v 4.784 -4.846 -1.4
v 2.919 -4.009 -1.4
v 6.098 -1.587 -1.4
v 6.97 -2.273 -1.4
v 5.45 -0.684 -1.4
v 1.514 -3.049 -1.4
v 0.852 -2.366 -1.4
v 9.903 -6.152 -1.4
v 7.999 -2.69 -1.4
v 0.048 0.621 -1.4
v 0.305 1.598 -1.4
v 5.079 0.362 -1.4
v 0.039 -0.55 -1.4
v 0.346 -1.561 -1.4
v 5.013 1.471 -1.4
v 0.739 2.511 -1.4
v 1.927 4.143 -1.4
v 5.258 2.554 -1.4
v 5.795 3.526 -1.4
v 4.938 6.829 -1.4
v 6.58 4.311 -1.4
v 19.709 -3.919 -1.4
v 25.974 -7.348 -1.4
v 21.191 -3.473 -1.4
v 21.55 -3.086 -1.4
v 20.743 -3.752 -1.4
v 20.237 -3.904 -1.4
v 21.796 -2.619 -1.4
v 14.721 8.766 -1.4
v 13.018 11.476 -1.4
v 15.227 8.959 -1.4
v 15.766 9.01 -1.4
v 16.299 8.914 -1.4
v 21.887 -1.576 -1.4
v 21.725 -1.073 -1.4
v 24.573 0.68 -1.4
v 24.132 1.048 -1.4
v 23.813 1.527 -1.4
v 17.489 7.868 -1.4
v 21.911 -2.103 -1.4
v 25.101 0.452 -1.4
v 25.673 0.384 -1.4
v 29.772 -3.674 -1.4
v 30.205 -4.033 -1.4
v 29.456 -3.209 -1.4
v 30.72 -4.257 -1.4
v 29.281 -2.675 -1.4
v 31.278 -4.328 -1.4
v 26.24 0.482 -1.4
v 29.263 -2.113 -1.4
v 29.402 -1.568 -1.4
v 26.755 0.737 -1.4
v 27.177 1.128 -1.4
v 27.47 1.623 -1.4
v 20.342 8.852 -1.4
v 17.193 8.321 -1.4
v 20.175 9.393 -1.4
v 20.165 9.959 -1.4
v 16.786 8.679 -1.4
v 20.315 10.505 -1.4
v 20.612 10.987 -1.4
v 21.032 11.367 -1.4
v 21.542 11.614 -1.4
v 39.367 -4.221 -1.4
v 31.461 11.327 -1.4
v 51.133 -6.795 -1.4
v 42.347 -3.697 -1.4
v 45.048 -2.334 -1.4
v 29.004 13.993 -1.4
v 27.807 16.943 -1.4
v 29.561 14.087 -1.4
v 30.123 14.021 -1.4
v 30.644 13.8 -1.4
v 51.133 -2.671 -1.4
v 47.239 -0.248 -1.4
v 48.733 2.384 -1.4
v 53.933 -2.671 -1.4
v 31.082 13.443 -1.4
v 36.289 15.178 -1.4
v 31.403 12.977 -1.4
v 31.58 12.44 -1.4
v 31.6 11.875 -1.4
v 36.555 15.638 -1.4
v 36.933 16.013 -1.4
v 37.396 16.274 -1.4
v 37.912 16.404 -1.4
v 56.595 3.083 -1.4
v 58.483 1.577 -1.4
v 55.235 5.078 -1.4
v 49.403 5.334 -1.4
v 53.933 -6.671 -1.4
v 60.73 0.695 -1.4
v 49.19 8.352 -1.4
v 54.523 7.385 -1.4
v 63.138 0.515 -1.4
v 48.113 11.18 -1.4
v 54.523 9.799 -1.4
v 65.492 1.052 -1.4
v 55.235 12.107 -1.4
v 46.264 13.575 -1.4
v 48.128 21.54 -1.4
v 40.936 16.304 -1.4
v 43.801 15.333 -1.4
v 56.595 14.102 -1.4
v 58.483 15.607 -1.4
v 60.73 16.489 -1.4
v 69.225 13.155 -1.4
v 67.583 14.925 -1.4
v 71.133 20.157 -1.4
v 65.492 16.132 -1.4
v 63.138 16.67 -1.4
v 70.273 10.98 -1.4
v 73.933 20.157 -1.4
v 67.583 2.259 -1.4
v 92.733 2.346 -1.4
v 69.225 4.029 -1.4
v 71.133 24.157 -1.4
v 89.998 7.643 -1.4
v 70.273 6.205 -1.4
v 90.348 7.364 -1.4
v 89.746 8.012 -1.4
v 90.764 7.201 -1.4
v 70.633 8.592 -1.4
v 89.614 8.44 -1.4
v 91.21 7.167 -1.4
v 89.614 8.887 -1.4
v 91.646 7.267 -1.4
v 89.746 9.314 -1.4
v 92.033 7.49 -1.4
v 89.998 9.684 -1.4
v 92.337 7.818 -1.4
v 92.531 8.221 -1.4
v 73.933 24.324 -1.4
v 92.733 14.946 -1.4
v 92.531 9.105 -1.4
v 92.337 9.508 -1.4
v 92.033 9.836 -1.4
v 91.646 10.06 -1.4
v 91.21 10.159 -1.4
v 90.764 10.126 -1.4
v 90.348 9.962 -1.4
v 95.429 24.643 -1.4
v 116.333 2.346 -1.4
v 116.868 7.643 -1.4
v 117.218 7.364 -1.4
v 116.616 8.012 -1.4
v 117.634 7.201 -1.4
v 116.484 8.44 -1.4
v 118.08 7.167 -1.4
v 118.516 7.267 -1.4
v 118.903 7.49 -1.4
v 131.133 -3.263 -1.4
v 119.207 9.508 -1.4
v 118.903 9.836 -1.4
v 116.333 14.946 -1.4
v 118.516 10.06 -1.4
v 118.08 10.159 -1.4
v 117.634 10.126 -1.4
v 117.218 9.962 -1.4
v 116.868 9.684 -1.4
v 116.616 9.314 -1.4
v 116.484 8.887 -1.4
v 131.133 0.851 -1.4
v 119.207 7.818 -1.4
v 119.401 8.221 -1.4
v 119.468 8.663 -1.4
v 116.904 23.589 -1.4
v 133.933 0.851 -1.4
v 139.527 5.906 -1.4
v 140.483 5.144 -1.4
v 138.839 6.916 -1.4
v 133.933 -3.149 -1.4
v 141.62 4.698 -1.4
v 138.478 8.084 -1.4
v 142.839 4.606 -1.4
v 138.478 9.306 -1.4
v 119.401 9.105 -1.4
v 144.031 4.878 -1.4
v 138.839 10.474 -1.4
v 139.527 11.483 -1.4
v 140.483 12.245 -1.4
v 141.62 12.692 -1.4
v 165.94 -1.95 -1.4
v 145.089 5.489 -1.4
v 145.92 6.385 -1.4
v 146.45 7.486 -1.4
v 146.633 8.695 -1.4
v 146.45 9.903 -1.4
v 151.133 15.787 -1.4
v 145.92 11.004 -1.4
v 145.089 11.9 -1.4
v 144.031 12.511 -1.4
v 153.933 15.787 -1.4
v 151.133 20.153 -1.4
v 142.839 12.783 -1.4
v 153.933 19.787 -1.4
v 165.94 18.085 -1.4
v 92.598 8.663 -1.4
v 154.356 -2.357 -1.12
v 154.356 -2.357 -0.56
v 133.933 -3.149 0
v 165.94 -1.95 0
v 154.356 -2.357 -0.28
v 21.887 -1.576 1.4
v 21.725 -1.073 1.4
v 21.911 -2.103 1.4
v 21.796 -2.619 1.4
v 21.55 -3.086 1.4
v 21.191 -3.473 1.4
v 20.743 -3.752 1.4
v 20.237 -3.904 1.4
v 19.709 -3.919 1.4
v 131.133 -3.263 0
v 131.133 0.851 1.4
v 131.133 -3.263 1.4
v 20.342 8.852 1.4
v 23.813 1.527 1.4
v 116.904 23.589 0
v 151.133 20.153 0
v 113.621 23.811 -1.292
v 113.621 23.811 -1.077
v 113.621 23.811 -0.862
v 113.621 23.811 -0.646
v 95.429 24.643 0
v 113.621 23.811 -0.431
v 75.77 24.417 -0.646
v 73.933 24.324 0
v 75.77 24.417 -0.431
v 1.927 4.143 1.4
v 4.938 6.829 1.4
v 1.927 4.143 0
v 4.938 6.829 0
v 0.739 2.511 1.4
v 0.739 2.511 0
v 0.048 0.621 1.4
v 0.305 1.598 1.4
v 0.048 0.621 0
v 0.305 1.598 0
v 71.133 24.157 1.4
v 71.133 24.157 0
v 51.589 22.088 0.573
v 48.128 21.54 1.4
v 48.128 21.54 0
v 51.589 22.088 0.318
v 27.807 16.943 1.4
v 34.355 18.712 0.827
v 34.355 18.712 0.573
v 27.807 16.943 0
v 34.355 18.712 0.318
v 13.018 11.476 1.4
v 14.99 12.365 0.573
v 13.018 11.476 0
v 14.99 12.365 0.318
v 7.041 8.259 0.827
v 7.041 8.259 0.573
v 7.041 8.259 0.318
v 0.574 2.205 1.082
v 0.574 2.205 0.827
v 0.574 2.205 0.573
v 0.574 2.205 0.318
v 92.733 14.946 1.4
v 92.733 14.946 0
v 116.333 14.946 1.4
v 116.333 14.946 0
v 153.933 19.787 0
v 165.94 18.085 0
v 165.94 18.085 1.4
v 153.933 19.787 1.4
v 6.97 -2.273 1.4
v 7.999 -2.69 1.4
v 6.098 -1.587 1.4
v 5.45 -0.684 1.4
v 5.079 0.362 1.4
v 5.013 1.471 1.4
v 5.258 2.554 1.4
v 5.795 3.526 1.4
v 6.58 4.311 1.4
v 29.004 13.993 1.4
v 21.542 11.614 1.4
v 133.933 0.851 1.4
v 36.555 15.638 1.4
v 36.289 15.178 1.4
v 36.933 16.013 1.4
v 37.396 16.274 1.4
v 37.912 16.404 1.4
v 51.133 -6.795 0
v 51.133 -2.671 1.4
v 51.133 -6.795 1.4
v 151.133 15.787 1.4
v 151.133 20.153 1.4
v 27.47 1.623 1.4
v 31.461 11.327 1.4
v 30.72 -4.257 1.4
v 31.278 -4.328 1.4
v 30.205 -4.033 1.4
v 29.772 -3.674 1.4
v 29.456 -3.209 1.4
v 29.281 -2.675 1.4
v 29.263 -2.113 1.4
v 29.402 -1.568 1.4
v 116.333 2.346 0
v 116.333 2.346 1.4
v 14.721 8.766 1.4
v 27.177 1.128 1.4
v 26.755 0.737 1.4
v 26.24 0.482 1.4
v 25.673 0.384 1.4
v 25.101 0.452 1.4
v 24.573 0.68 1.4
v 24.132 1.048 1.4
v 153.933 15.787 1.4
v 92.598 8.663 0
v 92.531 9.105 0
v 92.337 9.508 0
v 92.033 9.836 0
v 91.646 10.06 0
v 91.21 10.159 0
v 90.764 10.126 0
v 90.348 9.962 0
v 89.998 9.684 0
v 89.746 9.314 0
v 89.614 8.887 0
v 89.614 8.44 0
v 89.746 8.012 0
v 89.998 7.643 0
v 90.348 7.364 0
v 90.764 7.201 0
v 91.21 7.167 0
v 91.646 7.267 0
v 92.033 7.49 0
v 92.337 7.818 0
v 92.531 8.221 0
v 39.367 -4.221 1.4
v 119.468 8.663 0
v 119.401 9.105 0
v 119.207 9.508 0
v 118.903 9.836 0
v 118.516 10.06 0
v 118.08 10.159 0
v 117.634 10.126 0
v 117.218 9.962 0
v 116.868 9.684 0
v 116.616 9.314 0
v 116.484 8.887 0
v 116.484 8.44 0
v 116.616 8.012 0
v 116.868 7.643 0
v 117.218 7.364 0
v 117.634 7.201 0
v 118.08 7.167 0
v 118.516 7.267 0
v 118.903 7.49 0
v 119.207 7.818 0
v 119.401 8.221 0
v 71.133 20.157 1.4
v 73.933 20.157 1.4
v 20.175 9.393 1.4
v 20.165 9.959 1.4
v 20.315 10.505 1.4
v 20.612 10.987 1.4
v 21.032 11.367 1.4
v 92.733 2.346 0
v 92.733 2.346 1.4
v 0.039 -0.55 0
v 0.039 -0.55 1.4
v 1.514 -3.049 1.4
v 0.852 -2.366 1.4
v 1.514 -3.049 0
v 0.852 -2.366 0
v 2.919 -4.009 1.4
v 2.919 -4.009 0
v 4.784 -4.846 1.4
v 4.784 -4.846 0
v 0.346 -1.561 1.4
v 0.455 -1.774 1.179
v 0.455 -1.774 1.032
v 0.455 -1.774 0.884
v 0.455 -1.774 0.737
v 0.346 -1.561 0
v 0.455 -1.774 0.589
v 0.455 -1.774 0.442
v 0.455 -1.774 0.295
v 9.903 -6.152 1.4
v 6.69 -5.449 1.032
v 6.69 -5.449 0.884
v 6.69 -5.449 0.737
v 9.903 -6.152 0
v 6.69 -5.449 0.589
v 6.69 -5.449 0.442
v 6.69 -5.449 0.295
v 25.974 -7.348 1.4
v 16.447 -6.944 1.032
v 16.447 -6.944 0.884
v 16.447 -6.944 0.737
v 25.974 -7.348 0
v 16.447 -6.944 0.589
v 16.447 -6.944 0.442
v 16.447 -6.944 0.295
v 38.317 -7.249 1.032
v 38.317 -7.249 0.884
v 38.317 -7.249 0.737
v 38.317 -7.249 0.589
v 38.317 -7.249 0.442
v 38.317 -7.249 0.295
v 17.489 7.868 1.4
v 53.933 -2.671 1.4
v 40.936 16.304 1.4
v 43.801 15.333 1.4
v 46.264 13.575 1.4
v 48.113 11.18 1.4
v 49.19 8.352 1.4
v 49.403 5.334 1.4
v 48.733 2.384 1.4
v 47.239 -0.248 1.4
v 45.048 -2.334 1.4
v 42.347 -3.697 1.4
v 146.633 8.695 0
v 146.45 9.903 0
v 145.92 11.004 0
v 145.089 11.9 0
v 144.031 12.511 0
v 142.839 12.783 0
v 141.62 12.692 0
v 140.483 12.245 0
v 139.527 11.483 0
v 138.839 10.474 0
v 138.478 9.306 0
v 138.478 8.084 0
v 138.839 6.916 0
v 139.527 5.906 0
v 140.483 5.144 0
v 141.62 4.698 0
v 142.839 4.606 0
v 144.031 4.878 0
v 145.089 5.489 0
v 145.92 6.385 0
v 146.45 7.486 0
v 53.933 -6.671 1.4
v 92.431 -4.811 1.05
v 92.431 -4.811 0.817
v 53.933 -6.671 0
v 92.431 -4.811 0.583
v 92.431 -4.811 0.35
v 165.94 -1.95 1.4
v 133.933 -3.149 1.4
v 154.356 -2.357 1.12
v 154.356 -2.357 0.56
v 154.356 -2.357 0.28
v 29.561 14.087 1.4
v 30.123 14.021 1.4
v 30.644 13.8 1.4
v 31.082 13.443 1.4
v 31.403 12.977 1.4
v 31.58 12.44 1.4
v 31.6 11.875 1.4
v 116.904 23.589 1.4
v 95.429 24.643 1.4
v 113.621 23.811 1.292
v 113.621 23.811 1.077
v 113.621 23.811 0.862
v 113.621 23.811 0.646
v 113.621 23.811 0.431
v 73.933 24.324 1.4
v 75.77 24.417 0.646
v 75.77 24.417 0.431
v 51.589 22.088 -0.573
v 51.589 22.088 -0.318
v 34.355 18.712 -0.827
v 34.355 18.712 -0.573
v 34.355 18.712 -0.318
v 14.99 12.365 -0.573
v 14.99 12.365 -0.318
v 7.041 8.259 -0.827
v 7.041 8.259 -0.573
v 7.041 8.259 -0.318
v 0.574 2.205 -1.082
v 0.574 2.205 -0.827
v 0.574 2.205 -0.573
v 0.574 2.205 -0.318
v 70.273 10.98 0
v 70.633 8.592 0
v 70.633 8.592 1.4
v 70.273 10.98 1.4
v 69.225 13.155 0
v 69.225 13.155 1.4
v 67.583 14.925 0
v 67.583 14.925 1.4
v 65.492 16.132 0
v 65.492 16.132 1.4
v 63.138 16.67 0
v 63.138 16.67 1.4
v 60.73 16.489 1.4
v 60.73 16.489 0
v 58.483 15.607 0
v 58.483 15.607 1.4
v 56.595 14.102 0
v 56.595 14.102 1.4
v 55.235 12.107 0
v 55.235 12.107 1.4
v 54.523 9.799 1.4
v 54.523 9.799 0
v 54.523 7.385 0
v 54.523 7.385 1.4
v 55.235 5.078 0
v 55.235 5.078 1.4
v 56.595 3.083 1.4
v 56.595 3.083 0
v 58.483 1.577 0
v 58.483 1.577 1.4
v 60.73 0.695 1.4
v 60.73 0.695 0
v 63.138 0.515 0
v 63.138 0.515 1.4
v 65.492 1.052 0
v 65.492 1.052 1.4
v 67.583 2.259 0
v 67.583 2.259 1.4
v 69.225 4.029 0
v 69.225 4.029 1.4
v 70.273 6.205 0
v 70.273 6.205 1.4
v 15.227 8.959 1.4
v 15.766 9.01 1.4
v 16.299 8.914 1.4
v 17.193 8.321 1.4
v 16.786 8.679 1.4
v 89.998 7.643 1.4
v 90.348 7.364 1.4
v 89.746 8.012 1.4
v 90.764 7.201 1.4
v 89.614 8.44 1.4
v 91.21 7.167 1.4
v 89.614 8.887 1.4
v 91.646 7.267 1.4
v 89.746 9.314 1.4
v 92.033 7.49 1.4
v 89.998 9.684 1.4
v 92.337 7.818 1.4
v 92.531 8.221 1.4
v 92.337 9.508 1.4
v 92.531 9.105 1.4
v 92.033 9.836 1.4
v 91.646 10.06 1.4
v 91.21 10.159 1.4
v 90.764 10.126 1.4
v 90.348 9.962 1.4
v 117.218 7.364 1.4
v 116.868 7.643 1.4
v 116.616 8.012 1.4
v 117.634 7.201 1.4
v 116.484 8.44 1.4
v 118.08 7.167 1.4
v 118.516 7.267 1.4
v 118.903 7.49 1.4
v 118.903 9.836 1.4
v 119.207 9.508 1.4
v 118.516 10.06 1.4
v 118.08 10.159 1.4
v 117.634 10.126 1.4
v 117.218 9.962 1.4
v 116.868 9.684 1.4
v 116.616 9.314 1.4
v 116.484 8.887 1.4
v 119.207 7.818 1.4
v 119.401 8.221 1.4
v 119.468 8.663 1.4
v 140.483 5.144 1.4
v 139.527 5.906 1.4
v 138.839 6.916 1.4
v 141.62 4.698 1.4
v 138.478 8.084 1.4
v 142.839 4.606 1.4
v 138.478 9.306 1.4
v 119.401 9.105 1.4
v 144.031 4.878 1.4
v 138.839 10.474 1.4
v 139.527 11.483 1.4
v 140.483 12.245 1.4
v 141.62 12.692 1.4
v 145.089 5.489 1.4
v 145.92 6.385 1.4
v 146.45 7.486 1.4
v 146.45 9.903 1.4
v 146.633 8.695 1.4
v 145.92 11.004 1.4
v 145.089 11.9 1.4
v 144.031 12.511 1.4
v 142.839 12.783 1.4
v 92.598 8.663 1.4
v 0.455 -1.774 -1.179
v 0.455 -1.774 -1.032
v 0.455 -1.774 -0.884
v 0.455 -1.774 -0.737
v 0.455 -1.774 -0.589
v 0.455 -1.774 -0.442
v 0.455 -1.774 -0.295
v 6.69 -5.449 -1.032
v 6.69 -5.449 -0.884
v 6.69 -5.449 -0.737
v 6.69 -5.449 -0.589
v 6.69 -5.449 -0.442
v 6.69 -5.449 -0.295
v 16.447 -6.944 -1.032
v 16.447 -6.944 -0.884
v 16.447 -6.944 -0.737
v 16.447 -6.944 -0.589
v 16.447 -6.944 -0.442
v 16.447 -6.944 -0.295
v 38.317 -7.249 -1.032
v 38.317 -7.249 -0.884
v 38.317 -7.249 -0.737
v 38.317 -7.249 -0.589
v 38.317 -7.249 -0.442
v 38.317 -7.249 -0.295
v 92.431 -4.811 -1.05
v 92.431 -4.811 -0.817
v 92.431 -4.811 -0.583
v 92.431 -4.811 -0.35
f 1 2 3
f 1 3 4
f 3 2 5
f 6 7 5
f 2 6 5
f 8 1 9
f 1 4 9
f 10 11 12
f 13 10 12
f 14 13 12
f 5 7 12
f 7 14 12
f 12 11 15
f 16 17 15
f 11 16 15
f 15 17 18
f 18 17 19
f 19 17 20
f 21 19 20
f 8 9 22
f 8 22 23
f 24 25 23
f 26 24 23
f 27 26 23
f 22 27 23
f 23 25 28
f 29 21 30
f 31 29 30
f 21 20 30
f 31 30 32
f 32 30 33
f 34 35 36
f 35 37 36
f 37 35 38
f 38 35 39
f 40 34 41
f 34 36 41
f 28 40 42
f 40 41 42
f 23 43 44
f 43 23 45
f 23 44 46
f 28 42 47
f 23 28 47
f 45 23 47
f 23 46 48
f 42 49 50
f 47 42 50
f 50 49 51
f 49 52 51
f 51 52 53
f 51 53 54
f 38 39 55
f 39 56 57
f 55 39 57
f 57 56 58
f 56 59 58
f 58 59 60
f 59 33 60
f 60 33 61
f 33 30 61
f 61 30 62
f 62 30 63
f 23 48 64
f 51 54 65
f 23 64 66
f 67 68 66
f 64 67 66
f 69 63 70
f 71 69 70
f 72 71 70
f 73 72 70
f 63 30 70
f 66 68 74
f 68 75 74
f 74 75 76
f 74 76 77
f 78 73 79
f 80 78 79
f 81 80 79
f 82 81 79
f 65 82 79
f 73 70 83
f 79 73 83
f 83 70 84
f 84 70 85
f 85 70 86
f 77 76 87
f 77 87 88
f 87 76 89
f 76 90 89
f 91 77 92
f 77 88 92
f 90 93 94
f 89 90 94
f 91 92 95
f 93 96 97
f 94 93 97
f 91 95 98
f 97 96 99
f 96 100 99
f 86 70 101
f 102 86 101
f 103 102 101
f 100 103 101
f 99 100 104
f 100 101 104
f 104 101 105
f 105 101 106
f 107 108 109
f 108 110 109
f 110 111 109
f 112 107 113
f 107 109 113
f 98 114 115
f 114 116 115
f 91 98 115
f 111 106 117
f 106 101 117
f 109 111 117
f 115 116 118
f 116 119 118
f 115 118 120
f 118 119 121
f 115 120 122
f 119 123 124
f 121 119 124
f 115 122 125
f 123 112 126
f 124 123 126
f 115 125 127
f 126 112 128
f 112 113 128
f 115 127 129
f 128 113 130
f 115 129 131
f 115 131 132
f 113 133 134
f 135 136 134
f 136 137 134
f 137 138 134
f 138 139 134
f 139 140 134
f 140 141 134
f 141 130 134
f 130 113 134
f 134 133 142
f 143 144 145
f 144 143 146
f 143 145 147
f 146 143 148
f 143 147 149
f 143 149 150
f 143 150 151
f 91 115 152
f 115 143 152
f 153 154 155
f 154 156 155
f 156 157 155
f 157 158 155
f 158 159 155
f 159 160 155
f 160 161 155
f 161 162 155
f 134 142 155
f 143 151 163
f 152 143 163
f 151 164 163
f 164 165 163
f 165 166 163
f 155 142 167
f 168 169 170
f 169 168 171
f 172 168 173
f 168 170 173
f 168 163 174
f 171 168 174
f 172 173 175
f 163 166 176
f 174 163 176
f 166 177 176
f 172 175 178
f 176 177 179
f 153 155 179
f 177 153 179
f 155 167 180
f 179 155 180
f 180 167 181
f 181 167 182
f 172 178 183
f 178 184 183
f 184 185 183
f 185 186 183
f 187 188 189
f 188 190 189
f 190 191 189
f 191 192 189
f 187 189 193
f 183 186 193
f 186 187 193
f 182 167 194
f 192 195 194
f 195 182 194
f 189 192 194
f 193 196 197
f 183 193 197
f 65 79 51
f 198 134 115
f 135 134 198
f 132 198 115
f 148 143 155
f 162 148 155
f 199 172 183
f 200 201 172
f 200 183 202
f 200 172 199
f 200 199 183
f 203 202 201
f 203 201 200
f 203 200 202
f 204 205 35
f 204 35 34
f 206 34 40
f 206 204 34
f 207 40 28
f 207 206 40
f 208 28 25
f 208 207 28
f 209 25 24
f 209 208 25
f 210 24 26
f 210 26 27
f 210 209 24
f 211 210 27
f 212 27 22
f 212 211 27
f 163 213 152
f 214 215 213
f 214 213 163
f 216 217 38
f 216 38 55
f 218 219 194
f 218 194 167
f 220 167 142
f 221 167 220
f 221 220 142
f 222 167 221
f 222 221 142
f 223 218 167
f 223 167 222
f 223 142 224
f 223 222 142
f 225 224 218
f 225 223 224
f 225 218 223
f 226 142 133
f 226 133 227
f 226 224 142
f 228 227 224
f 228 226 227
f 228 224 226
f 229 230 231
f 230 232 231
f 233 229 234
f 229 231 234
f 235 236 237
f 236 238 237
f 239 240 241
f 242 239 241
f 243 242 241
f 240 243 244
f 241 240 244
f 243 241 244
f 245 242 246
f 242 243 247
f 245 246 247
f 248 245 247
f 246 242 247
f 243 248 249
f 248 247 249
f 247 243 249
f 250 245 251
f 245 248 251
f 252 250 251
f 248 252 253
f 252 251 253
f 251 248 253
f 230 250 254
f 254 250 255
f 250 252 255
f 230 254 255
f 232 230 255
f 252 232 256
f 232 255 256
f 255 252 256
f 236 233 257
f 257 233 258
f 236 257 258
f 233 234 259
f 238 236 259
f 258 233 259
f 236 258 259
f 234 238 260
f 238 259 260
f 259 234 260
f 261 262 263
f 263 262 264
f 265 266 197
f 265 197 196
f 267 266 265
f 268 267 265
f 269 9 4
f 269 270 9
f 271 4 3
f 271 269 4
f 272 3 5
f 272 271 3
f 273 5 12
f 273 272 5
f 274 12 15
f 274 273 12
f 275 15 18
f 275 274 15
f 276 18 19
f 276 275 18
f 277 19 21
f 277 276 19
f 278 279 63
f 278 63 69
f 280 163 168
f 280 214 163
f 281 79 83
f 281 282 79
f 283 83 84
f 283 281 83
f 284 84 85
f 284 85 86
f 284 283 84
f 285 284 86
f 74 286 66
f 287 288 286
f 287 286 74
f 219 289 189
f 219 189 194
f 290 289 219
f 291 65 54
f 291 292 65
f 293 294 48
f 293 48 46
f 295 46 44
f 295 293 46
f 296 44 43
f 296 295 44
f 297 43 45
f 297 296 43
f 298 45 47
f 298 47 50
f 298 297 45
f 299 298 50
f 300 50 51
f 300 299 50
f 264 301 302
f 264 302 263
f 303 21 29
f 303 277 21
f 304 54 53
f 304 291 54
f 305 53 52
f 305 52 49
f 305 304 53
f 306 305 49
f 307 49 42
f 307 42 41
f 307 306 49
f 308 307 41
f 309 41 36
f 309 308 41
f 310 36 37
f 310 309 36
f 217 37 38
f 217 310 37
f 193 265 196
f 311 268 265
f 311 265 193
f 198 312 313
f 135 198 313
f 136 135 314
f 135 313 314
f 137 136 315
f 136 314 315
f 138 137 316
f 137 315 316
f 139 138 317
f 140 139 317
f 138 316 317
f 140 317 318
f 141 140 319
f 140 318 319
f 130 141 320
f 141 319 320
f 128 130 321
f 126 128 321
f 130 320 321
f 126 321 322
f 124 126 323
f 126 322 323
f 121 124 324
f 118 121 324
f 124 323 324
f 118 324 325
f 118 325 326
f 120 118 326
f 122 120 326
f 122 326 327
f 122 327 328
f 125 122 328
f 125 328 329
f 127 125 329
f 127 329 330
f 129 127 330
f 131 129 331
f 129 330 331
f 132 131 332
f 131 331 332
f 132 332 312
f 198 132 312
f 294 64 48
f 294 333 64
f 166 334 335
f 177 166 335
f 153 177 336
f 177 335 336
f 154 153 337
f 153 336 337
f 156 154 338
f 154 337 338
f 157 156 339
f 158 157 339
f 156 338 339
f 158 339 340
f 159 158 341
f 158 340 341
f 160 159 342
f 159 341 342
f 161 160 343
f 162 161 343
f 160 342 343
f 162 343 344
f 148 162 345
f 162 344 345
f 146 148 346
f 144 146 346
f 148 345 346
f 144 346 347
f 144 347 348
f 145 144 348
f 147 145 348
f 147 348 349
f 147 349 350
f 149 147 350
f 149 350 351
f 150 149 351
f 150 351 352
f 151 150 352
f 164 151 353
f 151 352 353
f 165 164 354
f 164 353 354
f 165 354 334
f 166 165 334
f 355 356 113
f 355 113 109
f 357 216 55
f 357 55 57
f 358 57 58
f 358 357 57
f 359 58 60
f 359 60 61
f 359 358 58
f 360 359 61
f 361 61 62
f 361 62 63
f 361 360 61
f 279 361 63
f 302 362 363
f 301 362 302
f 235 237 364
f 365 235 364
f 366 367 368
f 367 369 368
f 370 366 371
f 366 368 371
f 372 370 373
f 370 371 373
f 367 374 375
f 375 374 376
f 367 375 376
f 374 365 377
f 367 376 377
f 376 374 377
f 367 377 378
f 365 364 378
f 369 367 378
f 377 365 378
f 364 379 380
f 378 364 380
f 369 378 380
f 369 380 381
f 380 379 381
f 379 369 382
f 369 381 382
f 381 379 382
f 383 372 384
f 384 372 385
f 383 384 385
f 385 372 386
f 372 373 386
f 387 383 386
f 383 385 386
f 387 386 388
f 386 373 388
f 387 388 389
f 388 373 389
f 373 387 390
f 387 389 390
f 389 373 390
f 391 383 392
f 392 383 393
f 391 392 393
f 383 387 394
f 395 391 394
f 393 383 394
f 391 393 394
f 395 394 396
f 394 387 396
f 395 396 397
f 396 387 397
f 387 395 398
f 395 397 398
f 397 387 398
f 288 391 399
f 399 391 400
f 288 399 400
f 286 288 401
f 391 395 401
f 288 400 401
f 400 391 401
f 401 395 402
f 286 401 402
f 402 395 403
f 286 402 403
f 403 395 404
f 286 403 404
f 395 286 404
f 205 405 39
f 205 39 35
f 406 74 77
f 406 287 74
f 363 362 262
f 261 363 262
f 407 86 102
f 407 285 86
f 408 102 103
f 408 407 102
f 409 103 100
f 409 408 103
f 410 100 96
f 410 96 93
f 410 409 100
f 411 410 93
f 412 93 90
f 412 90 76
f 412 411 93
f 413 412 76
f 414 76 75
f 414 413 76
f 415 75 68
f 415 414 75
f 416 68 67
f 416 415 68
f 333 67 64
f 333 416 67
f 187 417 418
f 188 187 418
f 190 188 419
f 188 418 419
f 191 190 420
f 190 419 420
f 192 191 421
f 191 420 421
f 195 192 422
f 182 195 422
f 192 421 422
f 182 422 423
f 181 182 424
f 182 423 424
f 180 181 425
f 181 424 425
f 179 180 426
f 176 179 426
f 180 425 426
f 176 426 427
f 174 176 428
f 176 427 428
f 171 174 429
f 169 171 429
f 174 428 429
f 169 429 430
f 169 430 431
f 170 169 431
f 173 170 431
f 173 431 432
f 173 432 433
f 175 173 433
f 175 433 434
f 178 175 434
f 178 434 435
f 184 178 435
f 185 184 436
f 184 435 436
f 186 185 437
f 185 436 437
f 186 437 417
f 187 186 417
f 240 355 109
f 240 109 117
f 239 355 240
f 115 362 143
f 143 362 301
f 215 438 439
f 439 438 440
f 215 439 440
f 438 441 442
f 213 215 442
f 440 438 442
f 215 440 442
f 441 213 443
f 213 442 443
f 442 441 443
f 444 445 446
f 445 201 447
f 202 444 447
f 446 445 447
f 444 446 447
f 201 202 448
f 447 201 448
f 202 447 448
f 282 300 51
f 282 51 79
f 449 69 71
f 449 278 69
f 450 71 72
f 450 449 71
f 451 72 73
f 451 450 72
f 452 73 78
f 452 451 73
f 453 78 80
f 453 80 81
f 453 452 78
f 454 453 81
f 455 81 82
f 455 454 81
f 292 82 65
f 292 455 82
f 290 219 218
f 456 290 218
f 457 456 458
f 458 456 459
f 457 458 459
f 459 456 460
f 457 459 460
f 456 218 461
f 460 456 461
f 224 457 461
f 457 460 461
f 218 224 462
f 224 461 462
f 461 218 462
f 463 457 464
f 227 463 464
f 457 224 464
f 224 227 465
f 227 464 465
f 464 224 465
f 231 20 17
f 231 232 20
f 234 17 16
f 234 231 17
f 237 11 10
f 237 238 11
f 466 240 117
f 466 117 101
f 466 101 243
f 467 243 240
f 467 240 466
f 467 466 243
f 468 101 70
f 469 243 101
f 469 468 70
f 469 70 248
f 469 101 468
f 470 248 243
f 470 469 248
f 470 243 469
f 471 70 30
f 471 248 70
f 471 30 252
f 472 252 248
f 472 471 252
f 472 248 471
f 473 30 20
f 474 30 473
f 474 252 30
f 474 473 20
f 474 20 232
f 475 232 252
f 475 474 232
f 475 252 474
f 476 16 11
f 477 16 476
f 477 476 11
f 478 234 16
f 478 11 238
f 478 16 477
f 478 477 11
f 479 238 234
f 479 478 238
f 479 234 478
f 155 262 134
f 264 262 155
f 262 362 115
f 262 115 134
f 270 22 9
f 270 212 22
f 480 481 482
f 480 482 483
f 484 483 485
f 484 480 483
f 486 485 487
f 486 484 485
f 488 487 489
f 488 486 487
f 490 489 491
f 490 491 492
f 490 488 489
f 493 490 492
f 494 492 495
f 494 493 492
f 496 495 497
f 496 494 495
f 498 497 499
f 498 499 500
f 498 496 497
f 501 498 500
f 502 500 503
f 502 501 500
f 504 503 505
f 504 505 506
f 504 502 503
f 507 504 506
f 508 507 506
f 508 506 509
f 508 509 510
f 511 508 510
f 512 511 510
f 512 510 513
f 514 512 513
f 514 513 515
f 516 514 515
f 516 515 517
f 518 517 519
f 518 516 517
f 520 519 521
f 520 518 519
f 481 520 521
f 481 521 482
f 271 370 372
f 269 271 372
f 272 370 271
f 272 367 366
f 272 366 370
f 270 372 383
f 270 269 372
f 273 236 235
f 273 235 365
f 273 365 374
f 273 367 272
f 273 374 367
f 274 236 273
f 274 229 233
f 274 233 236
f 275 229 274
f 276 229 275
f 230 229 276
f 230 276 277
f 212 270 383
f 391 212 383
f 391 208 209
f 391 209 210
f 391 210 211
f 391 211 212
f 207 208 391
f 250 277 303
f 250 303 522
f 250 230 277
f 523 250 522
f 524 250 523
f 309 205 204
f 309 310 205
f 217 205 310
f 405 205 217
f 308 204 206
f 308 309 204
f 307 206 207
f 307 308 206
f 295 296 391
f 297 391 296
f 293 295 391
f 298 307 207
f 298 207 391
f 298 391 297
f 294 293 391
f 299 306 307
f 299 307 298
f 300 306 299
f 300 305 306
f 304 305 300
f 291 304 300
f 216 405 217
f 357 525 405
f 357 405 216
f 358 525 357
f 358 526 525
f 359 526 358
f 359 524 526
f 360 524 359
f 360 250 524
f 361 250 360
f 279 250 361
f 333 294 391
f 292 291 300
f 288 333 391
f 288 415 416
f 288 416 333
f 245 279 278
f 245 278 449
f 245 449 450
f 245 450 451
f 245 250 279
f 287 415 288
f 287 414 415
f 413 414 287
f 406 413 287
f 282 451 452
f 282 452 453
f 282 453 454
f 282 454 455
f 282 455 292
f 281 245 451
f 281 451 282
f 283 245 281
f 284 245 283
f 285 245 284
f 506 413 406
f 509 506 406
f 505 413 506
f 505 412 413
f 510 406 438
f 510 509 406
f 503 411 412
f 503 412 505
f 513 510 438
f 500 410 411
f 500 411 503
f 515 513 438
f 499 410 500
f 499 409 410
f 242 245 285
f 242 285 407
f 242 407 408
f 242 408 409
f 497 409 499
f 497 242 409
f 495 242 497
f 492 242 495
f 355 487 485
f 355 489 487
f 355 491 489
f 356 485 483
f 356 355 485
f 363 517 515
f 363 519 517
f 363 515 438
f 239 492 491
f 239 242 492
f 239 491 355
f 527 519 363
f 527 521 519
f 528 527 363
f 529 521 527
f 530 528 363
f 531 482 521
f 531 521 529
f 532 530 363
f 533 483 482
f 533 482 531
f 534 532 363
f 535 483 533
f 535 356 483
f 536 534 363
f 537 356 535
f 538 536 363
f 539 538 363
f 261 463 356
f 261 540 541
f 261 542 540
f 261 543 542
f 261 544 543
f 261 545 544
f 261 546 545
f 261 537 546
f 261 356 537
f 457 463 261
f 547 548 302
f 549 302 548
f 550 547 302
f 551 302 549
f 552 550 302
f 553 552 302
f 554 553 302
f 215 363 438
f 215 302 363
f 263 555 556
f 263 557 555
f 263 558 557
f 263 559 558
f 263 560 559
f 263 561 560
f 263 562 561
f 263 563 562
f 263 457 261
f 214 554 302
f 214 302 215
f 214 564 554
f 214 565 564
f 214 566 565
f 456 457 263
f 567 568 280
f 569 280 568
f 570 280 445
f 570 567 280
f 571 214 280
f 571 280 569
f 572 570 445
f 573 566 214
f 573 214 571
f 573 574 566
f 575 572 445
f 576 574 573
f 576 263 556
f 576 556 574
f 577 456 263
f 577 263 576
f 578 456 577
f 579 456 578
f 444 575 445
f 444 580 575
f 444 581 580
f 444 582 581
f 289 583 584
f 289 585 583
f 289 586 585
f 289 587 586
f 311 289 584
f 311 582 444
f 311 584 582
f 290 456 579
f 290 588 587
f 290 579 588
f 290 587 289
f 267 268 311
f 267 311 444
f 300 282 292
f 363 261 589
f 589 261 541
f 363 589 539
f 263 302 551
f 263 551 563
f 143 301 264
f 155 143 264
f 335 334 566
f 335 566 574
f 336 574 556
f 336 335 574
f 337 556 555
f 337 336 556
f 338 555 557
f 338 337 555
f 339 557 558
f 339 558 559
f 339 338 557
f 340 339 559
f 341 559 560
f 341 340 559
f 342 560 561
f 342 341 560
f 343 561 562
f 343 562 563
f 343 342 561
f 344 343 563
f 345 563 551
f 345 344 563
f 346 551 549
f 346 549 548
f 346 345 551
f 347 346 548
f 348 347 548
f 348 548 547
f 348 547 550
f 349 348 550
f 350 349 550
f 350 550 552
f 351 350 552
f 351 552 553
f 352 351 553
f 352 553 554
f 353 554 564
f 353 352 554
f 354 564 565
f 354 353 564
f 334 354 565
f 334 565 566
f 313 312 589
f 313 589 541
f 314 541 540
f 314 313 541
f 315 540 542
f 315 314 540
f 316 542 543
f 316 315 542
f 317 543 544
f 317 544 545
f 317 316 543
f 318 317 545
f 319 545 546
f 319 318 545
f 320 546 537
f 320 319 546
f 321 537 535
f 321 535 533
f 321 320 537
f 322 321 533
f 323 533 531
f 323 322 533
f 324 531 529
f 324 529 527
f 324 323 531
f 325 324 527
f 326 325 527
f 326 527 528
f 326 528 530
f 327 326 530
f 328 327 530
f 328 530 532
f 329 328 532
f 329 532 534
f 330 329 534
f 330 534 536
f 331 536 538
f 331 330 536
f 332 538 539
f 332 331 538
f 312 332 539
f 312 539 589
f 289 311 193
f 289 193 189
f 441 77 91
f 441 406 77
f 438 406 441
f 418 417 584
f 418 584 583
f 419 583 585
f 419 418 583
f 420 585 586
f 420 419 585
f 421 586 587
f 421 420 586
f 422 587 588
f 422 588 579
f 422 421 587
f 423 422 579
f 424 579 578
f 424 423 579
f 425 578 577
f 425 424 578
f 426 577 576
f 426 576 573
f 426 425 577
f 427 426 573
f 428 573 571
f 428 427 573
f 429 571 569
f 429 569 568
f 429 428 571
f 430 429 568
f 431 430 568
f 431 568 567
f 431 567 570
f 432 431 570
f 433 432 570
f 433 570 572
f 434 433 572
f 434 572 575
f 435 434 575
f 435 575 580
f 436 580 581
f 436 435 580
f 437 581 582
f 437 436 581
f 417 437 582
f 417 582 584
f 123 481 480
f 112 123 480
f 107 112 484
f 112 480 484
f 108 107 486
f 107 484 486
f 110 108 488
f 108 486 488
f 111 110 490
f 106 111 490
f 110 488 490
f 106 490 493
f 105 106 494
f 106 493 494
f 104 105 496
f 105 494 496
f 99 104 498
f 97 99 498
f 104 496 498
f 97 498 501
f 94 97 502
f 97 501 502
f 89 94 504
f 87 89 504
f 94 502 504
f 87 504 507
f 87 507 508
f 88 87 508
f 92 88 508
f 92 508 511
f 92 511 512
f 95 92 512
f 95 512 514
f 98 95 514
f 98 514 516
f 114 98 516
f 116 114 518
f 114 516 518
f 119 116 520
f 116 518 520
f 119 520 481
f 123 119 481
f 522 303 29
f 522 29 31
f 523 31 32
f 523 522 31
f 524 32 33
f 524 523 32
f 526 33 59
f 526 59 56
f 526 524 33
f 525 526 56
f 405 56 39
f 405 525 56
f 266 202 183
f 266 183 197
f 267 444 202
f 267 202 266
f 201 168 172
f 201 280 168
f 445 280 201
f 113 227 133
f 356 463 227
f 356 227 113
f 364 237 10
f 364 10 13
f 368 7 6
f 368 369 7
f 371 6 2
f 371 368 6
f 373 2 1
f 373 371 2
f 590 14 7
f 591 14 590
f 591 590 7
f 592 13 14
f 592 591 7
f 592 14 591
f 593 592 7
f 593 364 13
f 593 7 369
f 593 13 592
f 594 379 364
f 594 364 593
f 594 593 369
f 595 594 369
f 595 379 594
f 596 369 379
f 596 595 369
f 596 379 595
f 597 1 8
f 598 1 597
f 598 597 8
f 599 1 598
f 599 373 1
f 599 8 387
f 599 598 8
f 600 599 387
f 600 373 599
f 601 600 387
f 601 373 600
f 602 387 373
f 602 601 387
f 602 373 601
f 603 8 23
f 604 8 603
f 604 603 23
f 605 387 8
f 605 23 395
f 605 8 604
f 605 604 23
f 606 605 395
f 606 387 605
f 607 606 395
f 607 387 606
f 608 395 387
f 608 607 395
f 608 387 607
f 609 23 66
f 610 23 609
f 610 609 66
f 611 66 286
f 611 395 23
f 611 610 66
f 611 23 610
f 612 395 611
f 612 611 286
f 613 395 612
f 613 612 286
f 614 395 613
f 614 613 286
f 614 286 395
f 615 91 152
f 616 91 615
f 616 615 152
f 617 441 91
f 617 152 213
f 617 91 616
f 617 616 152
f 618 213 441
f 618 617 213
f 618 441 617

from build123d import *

# Parameters (mm, degrees)
SKETCH_2_R      = 8.1
SKETCH_2_R_2    = 1.5
SKETCH_2_W      = 23.6
SKETCH_2_H      = 12.6
SKETCH_2_R_3    = 4.1
EXTRUDE_2_DEPTH = 1.4


with BuildPart() as part:
    # Эскиз2 → Бобышка-Вытянуть2 (new, symmetric)
    with BuildSketch(Plane.XY):
        with BuildLine():
            Line((165.940456932, 7.493910357), (165.940456932, 18.08535451))
            add(Edge.make_bspline(
                [(165.940456927, 18.085354477), (165.930512982, 18.086853188), (163.740114219, 18.416932942), (159.739714866, 19.000386852), (155.744292591, 19.547112651), (153.932619318, 19.787470759)],
                knots=[0.332761263, 0.332761263, 0.332761263, 0.332761263, 0.332878042, 0.358484538, 0.379707003, 0.379707003, 0.379707003, 0.379707003], degree=3))
            Line((153.932619318, 19.787470759), (153.932619318, 15.787470759))
            Line((153.932619318, 15.787470759), (151.132619318, 15.787470759))
            Line((151.132619318, 15.787470759), (151.132619318, 20.152925753))
            add(Edge.make_bspline(
                [(151.132619318, 20.152925753), (149.51271539, 20.360855756), (145.712882211, 20.834305053), (139.731359791, 21.525676112), (133.19183673, 22.212004248), (126.658683026, 22.825721427), (120.136770918, 23.363973264), (113.62856714, 23.824677322), (107.152732037, 24.200242592), (100.741095693, 24.498399508), (94.411752715, 24.686649766), (88.155917993, 24.740095648), (81.949043055, 24.658849141), (77.212383792, 24.491578654), (74.545027167, 24.35694527), (73.932619318, 24.323871534)],
                knots=[0.390637302, 0.390637302, 0.390637302, 0.390637302, 0.409602822, 0.435103874, 0.460559416, 0.485959195, 0.51130307, 0.536551515, 0.561723366, 0.586628867, 0.611085431, 0.6352512, 0.659272176, 0.683163753, 0.690285585, 0.690285585, 0.690285585, 0.690285585], degree=3))
            Line((73.932619318, 24.323871534), (73.932619318, 20.157469486))
            Line((73.932619318, 20.157469486), (71.132619318, 20.157469486))
            Line((71.132619318, 20.157469486), (71.132619318, 24.157469486))
            add(Edge.make_bspline(
                [(71.132619318, 24.157469486), (70.635982629, 24.125241372), (68.110579653, 23.953963558), (63.575410502, 23.578006358), (57.555189551, 22.924946655), (51.605762689, 22.119065518), (45.744400312, 21.156564429), (39.995857594, 20.035371386), (34.397919843, 18.75631623), (29.010382104, 17.327615604), (23.925798409, 15.771864917), (19.27067884, 14.13426943), (15.179098392, 12.483335433), (11.740475791, 10.89561099), (8.959371869, 9.429577361), (6.760891181, 8.108603195), (5.033709749, 6.92463805), (3.671694934, 5.85422966), (2.592101124, 4.871305364), (1.738175669, 3.952595739), (1.069870831, 3.080946369), (0.571645411, 2.241622098), (0.2157739, 1.430785392), (0.102255582, 0.88324169), (0.047975001, 0.621424995)],
                knots=[0.701142916, 0.701142916, 0.701142916, 0.701142916, 0.706922144, 0.73053591, 0.7539832, 0.77723469, 0.800246382, 0.822950709, 0.845237155, 0.866915896, 0.887662335, 0.906968281, 0.924203157, 0.938878975, 0.950931611, 0.960693484, 0.968646729, 0.975232933, 0.980794744, 0.985583761, 0.989781539, 0.993521313, 0.996902113, 1, 1, 1, 1], degree=3))
            add(Edge.make_bspline(
                [(0.047975001, 0.621424995), (0.022713821, 0.373490081), (-0.027820788, -0.12249998), (0.077991213, -0.884434595), (0.349695651, -1.638838075), (0.814331136, -2.365068928), (1.463480781, -3.039275249), (2.290973018, -3.660999474), (3.305928751, -4.235779626), (4.53525562, -4.773674148), (6.029745689, -5.282192169), (7.868981216, -5.765316681), (10.168831393, -6.221716597), (13.07543819, -6.639618735), (16.728115364, -6.992956742), (21.189952097, -7.247345149), (26.399984417, -7.376638853), (32.197398565, -7.376256917), (38.39780676, -7.261436583), (44.752137938, -7.05998551), (49.023344092, -6.886827907), (51.132619318, -6.795360627)],
                knots=[0, 0, 0, 0, 0.002941446, 0.005884319, 0.00901613, 0.012364547, 0.016007934, 0.020036845, 0.024573728, 0.029783835, 0.03589701, 0.04324044, 0.052275965, 0.063634589, 0.077983176, 0.095698161, 0.116520086, 0.13966073, 0.16431217, 0.18991889, 0.214908072, 0.214908072, 0.214908072, 0.214908072], degree=3))
            Line((51.132619318, -6.795360627), (51.132619318, -2.670677263))
            Line((51.132619318, -2.670677263), (53.932619318, -2.670677263))
            Line((53.932619318, -2.670677263), (53.932619318, -6.670677263))
            add(Edge.make_bspline(
                [(53.932619318, -6.670677263), (55.356569482, -6.605720394), (59.058679651, -6.431131786), (65.052094606, -6.13285227), (71.91077271, -5.784005184), (78.771375577, -5.439680462), (85.61049861, -5.110951262), (92.43210759, -4.804953337), (99.255031191, -4.531981668), (106.097378406, -4.278274685), (112.969211681, -4.003089942), (119.864404255, -3.723176202), (125.92308308, -3.47492717), (129.679854903, -3.321735217), (131.132619318, -3.262735091)],
                knots=[0.225966113, 0.225966113, 0.225966113, 0.225966113, 0.242837762, 0.269833583, 0.296993022, 0.324123272, 0.351139107, 0.378035509, 0.404946016, 0.431960837, 0.459078395, 0.4863474, 0.51364083, 0.530850189, 0.530850189, 0.530850189, 0.530850189], degree=3))
            Line((131.132619318, -3.262735091), (131.132619318, 0.850647814))
            Line((131.132619318, 0.850647814), (133.932619318, 0.850647814))
            Line((133.932619318, 0.850647814), (133.932619318, -3.149352186))
            add(Edge.make_bspline(
                [(133.932619318, -3.149352186), (136.150252366, -3.05984138), (140.66441482, -2.879164577), (147.472013762, -2.613922958), (154.352602411, -2.355626415), (160.507662095, -2.135075484), (164.369425992, -2.00299999), (165.940456932, -1.950382964)],
                knots=[0.541906346, 0.541906346, 0.541906346, 0.541906346, 0.568176028, 0.595379569, 0.622543445, 0.64967326, 0.668278692, 0.668278692, 0.668278692, 0.668278692], degree=3))
            Line((165.940456932, -1.950382964), (165.940456932, 7.493910357))
        make_face()
        with BuildLine():
            ThreePointArc((14.721240391, 8.766081587), (16.29867531, 8.913940332), (17.488708089, 7.868002897))
            Line((17.488708089, 7.868002897), (21.725441093, -1.073266618))
            ThreePointArc((21.725441093, -1.073266618), (21.549996986, -3.085882804), (19.709418924, -3.918755509))
            Line((19.709418924, -3.918755509), (7.999391348, -2.690370853))
            ThreePointArc((7.999391348, -2.690370853), (5.078852056, 0.362162442), (6.580135706, 4.311042875))
            Line((6.580135706, 4.311042875), (14.721240391, 8.766081587))
        make_face(mode=Mode.SUBTRACT)
        with BuildLine():
            Line((23.813024955, 1.527110532), (20.342244628, 8.85190119))
            ThreePointArc((20.342244628, 8.85190119), (20.315234657, 10.50521233), (21.542097769, 11.613803404))
            Line((21.542097769, 11.613803404), (29.003823035, 13.992759157))
            ThreePointArc((29.003823035, 13.992759157), (31.082028751, 13.44264333), (31.461008962, 11.326528867))
            Line((31.461008962, 11.326528867), (27.470064023, 1.622782457))
            ThreePointArc((27.470064023, 1.622782457), (25.672695714, 0.384197539), (23.813024955, 1.527110532))
        make_face(mode=Mode.SUBTRACT)
        with BuildLine():
            ThreePointArc((31.277857225, -4.328453595), (29.59717908, -3.452864074), (29.401621993, -1.567898965))
            Line((29.401621993, -1.567898965), (36.28872379, 15.177681436))
            ThreePointArc((36.28872379, 15.177681436), (36.93262885, 16.01260855), (37.911651949, 16.404055587))
            ThreePointArc((37.911651949, 16.404055587), (49.40696202, 6.85120019), (39.366777065, -4.221012142))
            Line((39.366777065, -4.221012142), (31.277857225, -4.328453595))
        make_face(mode=Mode.SUBTRACT)
        with Locations((62.532619318, 8.592254753)):
            Circle(SKETCH_2_R, mode=Mode.SUBTRACT)
        with Locations((91.097584877, 8.663246996)):
            Circle(SKETCH_2_R_2, mode=Mode.SUBTRACT)
        with Locations((104.532584877, 8.646041596)):
            Rectangle(SKETCH_2_W, SKETCH_2_H, mode=Mode.SUBTRACT)
        with Locations((117.967584877, 8.663246996)):
            Circle(SKETCH_2_R_2, mode=Mode.SUBTRACT)
        with Locations((142.532619318, 8.694705966)):
            Circle(SKETCH_2_R_3, mode=Mode.SUBTRACT)
    extrude(amount=EXTRUDE_2_DEPTH, both=True)


solid = part.part
